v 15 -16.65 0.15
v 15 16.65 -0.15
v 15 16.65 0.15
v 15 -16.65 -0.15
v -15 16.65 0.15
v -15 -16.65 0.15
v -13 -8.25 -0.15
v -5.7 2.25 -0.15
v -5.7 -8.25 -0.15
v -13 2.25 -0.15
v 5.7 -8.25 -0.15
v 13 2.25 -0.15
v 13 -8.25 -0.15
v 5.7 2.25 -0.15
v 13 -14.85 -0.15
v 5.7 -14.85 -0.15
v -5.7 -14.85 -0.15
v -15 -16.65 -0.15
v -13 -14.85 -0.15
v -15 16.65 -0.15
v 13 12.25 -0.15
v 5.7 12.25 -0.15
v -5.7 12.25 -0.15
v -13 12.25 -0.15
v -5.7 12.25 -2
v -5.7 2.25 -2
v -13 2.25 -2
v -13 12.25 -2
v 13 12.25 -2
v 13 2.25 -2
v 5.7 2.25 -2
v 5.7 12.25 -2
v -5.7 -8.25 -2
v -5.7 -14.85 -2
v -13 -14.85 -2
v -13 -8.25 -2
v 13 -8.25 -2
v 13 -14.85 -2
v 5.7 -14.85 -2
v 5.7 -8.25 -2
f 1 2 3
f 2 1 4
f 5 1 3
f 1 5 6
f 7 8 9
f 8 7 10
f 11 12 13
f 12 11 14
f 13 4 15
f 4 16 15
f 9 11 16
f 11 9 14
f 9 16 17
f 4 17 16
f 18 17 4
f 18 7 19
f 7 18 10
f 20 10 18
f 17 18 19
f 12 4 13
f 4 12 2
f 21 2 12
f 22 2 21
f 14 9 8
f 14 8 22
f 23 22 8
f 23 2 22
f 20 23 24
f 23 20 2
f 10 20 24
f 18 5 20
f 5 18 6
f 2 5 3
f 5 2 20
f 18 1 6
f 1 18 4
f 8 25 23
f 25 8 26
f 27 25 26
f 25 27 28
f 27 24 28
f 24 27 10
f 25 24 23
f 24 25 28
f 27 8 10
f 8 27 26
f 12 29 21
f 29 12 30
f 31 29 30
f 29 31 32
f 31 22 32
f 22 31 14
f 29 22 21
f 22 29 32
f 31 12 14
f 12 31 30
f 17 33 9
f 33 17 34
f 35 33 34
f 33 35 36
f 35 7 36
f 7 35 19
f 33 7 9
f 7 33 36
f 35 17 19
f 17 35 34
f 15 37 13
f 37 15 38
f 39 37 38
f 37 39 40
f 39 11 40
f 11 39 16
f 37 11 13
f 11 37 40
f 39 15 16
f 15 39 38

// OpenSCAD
xa = 30;
ya = 33.3;
za = 0.3;

cube(size=[xa,ya,za], center=true);

// Front flange
/*
translate(v=[0,4.75,-2]){
    cube(size=[10,0.5,4], center=true);
}*/

depth = 2;
guard = 2;

zoff = depth/2;

// Front flanges
yb = 10;
tyb = ((ya)/2) - (yb/2) - guard - 2.4;

xb = 7.3;
txb = ((xa)/2) - (xb/2) - guard;

// Center left flange
translate(v=[-txb,tyb,-zoff]){
    cube(size=[xb,yb,depth], center=true);
}

// Center right flange
translate(v=[txb,tyb,-zoff]){
    cube(size=[xb,yb,depth], center=true);
}

// Rear flanges

yc = 6.6;
tyc = ((ya) / 2) - (yc / 2) - guard + 0.2;

xc = 7.3;
txc = ((xa) / 2) - (xc / 2) - guard;

// Rear left flange
translate(v=[-txc,-tyc,-zoff]){
    cube(size=[xc, yc,depth], center=true);
}

// Rear right flange
translate(v=[txc,-tyc,-zoff]){
    cube(size=[xc,yc, depth], center=true);
}
